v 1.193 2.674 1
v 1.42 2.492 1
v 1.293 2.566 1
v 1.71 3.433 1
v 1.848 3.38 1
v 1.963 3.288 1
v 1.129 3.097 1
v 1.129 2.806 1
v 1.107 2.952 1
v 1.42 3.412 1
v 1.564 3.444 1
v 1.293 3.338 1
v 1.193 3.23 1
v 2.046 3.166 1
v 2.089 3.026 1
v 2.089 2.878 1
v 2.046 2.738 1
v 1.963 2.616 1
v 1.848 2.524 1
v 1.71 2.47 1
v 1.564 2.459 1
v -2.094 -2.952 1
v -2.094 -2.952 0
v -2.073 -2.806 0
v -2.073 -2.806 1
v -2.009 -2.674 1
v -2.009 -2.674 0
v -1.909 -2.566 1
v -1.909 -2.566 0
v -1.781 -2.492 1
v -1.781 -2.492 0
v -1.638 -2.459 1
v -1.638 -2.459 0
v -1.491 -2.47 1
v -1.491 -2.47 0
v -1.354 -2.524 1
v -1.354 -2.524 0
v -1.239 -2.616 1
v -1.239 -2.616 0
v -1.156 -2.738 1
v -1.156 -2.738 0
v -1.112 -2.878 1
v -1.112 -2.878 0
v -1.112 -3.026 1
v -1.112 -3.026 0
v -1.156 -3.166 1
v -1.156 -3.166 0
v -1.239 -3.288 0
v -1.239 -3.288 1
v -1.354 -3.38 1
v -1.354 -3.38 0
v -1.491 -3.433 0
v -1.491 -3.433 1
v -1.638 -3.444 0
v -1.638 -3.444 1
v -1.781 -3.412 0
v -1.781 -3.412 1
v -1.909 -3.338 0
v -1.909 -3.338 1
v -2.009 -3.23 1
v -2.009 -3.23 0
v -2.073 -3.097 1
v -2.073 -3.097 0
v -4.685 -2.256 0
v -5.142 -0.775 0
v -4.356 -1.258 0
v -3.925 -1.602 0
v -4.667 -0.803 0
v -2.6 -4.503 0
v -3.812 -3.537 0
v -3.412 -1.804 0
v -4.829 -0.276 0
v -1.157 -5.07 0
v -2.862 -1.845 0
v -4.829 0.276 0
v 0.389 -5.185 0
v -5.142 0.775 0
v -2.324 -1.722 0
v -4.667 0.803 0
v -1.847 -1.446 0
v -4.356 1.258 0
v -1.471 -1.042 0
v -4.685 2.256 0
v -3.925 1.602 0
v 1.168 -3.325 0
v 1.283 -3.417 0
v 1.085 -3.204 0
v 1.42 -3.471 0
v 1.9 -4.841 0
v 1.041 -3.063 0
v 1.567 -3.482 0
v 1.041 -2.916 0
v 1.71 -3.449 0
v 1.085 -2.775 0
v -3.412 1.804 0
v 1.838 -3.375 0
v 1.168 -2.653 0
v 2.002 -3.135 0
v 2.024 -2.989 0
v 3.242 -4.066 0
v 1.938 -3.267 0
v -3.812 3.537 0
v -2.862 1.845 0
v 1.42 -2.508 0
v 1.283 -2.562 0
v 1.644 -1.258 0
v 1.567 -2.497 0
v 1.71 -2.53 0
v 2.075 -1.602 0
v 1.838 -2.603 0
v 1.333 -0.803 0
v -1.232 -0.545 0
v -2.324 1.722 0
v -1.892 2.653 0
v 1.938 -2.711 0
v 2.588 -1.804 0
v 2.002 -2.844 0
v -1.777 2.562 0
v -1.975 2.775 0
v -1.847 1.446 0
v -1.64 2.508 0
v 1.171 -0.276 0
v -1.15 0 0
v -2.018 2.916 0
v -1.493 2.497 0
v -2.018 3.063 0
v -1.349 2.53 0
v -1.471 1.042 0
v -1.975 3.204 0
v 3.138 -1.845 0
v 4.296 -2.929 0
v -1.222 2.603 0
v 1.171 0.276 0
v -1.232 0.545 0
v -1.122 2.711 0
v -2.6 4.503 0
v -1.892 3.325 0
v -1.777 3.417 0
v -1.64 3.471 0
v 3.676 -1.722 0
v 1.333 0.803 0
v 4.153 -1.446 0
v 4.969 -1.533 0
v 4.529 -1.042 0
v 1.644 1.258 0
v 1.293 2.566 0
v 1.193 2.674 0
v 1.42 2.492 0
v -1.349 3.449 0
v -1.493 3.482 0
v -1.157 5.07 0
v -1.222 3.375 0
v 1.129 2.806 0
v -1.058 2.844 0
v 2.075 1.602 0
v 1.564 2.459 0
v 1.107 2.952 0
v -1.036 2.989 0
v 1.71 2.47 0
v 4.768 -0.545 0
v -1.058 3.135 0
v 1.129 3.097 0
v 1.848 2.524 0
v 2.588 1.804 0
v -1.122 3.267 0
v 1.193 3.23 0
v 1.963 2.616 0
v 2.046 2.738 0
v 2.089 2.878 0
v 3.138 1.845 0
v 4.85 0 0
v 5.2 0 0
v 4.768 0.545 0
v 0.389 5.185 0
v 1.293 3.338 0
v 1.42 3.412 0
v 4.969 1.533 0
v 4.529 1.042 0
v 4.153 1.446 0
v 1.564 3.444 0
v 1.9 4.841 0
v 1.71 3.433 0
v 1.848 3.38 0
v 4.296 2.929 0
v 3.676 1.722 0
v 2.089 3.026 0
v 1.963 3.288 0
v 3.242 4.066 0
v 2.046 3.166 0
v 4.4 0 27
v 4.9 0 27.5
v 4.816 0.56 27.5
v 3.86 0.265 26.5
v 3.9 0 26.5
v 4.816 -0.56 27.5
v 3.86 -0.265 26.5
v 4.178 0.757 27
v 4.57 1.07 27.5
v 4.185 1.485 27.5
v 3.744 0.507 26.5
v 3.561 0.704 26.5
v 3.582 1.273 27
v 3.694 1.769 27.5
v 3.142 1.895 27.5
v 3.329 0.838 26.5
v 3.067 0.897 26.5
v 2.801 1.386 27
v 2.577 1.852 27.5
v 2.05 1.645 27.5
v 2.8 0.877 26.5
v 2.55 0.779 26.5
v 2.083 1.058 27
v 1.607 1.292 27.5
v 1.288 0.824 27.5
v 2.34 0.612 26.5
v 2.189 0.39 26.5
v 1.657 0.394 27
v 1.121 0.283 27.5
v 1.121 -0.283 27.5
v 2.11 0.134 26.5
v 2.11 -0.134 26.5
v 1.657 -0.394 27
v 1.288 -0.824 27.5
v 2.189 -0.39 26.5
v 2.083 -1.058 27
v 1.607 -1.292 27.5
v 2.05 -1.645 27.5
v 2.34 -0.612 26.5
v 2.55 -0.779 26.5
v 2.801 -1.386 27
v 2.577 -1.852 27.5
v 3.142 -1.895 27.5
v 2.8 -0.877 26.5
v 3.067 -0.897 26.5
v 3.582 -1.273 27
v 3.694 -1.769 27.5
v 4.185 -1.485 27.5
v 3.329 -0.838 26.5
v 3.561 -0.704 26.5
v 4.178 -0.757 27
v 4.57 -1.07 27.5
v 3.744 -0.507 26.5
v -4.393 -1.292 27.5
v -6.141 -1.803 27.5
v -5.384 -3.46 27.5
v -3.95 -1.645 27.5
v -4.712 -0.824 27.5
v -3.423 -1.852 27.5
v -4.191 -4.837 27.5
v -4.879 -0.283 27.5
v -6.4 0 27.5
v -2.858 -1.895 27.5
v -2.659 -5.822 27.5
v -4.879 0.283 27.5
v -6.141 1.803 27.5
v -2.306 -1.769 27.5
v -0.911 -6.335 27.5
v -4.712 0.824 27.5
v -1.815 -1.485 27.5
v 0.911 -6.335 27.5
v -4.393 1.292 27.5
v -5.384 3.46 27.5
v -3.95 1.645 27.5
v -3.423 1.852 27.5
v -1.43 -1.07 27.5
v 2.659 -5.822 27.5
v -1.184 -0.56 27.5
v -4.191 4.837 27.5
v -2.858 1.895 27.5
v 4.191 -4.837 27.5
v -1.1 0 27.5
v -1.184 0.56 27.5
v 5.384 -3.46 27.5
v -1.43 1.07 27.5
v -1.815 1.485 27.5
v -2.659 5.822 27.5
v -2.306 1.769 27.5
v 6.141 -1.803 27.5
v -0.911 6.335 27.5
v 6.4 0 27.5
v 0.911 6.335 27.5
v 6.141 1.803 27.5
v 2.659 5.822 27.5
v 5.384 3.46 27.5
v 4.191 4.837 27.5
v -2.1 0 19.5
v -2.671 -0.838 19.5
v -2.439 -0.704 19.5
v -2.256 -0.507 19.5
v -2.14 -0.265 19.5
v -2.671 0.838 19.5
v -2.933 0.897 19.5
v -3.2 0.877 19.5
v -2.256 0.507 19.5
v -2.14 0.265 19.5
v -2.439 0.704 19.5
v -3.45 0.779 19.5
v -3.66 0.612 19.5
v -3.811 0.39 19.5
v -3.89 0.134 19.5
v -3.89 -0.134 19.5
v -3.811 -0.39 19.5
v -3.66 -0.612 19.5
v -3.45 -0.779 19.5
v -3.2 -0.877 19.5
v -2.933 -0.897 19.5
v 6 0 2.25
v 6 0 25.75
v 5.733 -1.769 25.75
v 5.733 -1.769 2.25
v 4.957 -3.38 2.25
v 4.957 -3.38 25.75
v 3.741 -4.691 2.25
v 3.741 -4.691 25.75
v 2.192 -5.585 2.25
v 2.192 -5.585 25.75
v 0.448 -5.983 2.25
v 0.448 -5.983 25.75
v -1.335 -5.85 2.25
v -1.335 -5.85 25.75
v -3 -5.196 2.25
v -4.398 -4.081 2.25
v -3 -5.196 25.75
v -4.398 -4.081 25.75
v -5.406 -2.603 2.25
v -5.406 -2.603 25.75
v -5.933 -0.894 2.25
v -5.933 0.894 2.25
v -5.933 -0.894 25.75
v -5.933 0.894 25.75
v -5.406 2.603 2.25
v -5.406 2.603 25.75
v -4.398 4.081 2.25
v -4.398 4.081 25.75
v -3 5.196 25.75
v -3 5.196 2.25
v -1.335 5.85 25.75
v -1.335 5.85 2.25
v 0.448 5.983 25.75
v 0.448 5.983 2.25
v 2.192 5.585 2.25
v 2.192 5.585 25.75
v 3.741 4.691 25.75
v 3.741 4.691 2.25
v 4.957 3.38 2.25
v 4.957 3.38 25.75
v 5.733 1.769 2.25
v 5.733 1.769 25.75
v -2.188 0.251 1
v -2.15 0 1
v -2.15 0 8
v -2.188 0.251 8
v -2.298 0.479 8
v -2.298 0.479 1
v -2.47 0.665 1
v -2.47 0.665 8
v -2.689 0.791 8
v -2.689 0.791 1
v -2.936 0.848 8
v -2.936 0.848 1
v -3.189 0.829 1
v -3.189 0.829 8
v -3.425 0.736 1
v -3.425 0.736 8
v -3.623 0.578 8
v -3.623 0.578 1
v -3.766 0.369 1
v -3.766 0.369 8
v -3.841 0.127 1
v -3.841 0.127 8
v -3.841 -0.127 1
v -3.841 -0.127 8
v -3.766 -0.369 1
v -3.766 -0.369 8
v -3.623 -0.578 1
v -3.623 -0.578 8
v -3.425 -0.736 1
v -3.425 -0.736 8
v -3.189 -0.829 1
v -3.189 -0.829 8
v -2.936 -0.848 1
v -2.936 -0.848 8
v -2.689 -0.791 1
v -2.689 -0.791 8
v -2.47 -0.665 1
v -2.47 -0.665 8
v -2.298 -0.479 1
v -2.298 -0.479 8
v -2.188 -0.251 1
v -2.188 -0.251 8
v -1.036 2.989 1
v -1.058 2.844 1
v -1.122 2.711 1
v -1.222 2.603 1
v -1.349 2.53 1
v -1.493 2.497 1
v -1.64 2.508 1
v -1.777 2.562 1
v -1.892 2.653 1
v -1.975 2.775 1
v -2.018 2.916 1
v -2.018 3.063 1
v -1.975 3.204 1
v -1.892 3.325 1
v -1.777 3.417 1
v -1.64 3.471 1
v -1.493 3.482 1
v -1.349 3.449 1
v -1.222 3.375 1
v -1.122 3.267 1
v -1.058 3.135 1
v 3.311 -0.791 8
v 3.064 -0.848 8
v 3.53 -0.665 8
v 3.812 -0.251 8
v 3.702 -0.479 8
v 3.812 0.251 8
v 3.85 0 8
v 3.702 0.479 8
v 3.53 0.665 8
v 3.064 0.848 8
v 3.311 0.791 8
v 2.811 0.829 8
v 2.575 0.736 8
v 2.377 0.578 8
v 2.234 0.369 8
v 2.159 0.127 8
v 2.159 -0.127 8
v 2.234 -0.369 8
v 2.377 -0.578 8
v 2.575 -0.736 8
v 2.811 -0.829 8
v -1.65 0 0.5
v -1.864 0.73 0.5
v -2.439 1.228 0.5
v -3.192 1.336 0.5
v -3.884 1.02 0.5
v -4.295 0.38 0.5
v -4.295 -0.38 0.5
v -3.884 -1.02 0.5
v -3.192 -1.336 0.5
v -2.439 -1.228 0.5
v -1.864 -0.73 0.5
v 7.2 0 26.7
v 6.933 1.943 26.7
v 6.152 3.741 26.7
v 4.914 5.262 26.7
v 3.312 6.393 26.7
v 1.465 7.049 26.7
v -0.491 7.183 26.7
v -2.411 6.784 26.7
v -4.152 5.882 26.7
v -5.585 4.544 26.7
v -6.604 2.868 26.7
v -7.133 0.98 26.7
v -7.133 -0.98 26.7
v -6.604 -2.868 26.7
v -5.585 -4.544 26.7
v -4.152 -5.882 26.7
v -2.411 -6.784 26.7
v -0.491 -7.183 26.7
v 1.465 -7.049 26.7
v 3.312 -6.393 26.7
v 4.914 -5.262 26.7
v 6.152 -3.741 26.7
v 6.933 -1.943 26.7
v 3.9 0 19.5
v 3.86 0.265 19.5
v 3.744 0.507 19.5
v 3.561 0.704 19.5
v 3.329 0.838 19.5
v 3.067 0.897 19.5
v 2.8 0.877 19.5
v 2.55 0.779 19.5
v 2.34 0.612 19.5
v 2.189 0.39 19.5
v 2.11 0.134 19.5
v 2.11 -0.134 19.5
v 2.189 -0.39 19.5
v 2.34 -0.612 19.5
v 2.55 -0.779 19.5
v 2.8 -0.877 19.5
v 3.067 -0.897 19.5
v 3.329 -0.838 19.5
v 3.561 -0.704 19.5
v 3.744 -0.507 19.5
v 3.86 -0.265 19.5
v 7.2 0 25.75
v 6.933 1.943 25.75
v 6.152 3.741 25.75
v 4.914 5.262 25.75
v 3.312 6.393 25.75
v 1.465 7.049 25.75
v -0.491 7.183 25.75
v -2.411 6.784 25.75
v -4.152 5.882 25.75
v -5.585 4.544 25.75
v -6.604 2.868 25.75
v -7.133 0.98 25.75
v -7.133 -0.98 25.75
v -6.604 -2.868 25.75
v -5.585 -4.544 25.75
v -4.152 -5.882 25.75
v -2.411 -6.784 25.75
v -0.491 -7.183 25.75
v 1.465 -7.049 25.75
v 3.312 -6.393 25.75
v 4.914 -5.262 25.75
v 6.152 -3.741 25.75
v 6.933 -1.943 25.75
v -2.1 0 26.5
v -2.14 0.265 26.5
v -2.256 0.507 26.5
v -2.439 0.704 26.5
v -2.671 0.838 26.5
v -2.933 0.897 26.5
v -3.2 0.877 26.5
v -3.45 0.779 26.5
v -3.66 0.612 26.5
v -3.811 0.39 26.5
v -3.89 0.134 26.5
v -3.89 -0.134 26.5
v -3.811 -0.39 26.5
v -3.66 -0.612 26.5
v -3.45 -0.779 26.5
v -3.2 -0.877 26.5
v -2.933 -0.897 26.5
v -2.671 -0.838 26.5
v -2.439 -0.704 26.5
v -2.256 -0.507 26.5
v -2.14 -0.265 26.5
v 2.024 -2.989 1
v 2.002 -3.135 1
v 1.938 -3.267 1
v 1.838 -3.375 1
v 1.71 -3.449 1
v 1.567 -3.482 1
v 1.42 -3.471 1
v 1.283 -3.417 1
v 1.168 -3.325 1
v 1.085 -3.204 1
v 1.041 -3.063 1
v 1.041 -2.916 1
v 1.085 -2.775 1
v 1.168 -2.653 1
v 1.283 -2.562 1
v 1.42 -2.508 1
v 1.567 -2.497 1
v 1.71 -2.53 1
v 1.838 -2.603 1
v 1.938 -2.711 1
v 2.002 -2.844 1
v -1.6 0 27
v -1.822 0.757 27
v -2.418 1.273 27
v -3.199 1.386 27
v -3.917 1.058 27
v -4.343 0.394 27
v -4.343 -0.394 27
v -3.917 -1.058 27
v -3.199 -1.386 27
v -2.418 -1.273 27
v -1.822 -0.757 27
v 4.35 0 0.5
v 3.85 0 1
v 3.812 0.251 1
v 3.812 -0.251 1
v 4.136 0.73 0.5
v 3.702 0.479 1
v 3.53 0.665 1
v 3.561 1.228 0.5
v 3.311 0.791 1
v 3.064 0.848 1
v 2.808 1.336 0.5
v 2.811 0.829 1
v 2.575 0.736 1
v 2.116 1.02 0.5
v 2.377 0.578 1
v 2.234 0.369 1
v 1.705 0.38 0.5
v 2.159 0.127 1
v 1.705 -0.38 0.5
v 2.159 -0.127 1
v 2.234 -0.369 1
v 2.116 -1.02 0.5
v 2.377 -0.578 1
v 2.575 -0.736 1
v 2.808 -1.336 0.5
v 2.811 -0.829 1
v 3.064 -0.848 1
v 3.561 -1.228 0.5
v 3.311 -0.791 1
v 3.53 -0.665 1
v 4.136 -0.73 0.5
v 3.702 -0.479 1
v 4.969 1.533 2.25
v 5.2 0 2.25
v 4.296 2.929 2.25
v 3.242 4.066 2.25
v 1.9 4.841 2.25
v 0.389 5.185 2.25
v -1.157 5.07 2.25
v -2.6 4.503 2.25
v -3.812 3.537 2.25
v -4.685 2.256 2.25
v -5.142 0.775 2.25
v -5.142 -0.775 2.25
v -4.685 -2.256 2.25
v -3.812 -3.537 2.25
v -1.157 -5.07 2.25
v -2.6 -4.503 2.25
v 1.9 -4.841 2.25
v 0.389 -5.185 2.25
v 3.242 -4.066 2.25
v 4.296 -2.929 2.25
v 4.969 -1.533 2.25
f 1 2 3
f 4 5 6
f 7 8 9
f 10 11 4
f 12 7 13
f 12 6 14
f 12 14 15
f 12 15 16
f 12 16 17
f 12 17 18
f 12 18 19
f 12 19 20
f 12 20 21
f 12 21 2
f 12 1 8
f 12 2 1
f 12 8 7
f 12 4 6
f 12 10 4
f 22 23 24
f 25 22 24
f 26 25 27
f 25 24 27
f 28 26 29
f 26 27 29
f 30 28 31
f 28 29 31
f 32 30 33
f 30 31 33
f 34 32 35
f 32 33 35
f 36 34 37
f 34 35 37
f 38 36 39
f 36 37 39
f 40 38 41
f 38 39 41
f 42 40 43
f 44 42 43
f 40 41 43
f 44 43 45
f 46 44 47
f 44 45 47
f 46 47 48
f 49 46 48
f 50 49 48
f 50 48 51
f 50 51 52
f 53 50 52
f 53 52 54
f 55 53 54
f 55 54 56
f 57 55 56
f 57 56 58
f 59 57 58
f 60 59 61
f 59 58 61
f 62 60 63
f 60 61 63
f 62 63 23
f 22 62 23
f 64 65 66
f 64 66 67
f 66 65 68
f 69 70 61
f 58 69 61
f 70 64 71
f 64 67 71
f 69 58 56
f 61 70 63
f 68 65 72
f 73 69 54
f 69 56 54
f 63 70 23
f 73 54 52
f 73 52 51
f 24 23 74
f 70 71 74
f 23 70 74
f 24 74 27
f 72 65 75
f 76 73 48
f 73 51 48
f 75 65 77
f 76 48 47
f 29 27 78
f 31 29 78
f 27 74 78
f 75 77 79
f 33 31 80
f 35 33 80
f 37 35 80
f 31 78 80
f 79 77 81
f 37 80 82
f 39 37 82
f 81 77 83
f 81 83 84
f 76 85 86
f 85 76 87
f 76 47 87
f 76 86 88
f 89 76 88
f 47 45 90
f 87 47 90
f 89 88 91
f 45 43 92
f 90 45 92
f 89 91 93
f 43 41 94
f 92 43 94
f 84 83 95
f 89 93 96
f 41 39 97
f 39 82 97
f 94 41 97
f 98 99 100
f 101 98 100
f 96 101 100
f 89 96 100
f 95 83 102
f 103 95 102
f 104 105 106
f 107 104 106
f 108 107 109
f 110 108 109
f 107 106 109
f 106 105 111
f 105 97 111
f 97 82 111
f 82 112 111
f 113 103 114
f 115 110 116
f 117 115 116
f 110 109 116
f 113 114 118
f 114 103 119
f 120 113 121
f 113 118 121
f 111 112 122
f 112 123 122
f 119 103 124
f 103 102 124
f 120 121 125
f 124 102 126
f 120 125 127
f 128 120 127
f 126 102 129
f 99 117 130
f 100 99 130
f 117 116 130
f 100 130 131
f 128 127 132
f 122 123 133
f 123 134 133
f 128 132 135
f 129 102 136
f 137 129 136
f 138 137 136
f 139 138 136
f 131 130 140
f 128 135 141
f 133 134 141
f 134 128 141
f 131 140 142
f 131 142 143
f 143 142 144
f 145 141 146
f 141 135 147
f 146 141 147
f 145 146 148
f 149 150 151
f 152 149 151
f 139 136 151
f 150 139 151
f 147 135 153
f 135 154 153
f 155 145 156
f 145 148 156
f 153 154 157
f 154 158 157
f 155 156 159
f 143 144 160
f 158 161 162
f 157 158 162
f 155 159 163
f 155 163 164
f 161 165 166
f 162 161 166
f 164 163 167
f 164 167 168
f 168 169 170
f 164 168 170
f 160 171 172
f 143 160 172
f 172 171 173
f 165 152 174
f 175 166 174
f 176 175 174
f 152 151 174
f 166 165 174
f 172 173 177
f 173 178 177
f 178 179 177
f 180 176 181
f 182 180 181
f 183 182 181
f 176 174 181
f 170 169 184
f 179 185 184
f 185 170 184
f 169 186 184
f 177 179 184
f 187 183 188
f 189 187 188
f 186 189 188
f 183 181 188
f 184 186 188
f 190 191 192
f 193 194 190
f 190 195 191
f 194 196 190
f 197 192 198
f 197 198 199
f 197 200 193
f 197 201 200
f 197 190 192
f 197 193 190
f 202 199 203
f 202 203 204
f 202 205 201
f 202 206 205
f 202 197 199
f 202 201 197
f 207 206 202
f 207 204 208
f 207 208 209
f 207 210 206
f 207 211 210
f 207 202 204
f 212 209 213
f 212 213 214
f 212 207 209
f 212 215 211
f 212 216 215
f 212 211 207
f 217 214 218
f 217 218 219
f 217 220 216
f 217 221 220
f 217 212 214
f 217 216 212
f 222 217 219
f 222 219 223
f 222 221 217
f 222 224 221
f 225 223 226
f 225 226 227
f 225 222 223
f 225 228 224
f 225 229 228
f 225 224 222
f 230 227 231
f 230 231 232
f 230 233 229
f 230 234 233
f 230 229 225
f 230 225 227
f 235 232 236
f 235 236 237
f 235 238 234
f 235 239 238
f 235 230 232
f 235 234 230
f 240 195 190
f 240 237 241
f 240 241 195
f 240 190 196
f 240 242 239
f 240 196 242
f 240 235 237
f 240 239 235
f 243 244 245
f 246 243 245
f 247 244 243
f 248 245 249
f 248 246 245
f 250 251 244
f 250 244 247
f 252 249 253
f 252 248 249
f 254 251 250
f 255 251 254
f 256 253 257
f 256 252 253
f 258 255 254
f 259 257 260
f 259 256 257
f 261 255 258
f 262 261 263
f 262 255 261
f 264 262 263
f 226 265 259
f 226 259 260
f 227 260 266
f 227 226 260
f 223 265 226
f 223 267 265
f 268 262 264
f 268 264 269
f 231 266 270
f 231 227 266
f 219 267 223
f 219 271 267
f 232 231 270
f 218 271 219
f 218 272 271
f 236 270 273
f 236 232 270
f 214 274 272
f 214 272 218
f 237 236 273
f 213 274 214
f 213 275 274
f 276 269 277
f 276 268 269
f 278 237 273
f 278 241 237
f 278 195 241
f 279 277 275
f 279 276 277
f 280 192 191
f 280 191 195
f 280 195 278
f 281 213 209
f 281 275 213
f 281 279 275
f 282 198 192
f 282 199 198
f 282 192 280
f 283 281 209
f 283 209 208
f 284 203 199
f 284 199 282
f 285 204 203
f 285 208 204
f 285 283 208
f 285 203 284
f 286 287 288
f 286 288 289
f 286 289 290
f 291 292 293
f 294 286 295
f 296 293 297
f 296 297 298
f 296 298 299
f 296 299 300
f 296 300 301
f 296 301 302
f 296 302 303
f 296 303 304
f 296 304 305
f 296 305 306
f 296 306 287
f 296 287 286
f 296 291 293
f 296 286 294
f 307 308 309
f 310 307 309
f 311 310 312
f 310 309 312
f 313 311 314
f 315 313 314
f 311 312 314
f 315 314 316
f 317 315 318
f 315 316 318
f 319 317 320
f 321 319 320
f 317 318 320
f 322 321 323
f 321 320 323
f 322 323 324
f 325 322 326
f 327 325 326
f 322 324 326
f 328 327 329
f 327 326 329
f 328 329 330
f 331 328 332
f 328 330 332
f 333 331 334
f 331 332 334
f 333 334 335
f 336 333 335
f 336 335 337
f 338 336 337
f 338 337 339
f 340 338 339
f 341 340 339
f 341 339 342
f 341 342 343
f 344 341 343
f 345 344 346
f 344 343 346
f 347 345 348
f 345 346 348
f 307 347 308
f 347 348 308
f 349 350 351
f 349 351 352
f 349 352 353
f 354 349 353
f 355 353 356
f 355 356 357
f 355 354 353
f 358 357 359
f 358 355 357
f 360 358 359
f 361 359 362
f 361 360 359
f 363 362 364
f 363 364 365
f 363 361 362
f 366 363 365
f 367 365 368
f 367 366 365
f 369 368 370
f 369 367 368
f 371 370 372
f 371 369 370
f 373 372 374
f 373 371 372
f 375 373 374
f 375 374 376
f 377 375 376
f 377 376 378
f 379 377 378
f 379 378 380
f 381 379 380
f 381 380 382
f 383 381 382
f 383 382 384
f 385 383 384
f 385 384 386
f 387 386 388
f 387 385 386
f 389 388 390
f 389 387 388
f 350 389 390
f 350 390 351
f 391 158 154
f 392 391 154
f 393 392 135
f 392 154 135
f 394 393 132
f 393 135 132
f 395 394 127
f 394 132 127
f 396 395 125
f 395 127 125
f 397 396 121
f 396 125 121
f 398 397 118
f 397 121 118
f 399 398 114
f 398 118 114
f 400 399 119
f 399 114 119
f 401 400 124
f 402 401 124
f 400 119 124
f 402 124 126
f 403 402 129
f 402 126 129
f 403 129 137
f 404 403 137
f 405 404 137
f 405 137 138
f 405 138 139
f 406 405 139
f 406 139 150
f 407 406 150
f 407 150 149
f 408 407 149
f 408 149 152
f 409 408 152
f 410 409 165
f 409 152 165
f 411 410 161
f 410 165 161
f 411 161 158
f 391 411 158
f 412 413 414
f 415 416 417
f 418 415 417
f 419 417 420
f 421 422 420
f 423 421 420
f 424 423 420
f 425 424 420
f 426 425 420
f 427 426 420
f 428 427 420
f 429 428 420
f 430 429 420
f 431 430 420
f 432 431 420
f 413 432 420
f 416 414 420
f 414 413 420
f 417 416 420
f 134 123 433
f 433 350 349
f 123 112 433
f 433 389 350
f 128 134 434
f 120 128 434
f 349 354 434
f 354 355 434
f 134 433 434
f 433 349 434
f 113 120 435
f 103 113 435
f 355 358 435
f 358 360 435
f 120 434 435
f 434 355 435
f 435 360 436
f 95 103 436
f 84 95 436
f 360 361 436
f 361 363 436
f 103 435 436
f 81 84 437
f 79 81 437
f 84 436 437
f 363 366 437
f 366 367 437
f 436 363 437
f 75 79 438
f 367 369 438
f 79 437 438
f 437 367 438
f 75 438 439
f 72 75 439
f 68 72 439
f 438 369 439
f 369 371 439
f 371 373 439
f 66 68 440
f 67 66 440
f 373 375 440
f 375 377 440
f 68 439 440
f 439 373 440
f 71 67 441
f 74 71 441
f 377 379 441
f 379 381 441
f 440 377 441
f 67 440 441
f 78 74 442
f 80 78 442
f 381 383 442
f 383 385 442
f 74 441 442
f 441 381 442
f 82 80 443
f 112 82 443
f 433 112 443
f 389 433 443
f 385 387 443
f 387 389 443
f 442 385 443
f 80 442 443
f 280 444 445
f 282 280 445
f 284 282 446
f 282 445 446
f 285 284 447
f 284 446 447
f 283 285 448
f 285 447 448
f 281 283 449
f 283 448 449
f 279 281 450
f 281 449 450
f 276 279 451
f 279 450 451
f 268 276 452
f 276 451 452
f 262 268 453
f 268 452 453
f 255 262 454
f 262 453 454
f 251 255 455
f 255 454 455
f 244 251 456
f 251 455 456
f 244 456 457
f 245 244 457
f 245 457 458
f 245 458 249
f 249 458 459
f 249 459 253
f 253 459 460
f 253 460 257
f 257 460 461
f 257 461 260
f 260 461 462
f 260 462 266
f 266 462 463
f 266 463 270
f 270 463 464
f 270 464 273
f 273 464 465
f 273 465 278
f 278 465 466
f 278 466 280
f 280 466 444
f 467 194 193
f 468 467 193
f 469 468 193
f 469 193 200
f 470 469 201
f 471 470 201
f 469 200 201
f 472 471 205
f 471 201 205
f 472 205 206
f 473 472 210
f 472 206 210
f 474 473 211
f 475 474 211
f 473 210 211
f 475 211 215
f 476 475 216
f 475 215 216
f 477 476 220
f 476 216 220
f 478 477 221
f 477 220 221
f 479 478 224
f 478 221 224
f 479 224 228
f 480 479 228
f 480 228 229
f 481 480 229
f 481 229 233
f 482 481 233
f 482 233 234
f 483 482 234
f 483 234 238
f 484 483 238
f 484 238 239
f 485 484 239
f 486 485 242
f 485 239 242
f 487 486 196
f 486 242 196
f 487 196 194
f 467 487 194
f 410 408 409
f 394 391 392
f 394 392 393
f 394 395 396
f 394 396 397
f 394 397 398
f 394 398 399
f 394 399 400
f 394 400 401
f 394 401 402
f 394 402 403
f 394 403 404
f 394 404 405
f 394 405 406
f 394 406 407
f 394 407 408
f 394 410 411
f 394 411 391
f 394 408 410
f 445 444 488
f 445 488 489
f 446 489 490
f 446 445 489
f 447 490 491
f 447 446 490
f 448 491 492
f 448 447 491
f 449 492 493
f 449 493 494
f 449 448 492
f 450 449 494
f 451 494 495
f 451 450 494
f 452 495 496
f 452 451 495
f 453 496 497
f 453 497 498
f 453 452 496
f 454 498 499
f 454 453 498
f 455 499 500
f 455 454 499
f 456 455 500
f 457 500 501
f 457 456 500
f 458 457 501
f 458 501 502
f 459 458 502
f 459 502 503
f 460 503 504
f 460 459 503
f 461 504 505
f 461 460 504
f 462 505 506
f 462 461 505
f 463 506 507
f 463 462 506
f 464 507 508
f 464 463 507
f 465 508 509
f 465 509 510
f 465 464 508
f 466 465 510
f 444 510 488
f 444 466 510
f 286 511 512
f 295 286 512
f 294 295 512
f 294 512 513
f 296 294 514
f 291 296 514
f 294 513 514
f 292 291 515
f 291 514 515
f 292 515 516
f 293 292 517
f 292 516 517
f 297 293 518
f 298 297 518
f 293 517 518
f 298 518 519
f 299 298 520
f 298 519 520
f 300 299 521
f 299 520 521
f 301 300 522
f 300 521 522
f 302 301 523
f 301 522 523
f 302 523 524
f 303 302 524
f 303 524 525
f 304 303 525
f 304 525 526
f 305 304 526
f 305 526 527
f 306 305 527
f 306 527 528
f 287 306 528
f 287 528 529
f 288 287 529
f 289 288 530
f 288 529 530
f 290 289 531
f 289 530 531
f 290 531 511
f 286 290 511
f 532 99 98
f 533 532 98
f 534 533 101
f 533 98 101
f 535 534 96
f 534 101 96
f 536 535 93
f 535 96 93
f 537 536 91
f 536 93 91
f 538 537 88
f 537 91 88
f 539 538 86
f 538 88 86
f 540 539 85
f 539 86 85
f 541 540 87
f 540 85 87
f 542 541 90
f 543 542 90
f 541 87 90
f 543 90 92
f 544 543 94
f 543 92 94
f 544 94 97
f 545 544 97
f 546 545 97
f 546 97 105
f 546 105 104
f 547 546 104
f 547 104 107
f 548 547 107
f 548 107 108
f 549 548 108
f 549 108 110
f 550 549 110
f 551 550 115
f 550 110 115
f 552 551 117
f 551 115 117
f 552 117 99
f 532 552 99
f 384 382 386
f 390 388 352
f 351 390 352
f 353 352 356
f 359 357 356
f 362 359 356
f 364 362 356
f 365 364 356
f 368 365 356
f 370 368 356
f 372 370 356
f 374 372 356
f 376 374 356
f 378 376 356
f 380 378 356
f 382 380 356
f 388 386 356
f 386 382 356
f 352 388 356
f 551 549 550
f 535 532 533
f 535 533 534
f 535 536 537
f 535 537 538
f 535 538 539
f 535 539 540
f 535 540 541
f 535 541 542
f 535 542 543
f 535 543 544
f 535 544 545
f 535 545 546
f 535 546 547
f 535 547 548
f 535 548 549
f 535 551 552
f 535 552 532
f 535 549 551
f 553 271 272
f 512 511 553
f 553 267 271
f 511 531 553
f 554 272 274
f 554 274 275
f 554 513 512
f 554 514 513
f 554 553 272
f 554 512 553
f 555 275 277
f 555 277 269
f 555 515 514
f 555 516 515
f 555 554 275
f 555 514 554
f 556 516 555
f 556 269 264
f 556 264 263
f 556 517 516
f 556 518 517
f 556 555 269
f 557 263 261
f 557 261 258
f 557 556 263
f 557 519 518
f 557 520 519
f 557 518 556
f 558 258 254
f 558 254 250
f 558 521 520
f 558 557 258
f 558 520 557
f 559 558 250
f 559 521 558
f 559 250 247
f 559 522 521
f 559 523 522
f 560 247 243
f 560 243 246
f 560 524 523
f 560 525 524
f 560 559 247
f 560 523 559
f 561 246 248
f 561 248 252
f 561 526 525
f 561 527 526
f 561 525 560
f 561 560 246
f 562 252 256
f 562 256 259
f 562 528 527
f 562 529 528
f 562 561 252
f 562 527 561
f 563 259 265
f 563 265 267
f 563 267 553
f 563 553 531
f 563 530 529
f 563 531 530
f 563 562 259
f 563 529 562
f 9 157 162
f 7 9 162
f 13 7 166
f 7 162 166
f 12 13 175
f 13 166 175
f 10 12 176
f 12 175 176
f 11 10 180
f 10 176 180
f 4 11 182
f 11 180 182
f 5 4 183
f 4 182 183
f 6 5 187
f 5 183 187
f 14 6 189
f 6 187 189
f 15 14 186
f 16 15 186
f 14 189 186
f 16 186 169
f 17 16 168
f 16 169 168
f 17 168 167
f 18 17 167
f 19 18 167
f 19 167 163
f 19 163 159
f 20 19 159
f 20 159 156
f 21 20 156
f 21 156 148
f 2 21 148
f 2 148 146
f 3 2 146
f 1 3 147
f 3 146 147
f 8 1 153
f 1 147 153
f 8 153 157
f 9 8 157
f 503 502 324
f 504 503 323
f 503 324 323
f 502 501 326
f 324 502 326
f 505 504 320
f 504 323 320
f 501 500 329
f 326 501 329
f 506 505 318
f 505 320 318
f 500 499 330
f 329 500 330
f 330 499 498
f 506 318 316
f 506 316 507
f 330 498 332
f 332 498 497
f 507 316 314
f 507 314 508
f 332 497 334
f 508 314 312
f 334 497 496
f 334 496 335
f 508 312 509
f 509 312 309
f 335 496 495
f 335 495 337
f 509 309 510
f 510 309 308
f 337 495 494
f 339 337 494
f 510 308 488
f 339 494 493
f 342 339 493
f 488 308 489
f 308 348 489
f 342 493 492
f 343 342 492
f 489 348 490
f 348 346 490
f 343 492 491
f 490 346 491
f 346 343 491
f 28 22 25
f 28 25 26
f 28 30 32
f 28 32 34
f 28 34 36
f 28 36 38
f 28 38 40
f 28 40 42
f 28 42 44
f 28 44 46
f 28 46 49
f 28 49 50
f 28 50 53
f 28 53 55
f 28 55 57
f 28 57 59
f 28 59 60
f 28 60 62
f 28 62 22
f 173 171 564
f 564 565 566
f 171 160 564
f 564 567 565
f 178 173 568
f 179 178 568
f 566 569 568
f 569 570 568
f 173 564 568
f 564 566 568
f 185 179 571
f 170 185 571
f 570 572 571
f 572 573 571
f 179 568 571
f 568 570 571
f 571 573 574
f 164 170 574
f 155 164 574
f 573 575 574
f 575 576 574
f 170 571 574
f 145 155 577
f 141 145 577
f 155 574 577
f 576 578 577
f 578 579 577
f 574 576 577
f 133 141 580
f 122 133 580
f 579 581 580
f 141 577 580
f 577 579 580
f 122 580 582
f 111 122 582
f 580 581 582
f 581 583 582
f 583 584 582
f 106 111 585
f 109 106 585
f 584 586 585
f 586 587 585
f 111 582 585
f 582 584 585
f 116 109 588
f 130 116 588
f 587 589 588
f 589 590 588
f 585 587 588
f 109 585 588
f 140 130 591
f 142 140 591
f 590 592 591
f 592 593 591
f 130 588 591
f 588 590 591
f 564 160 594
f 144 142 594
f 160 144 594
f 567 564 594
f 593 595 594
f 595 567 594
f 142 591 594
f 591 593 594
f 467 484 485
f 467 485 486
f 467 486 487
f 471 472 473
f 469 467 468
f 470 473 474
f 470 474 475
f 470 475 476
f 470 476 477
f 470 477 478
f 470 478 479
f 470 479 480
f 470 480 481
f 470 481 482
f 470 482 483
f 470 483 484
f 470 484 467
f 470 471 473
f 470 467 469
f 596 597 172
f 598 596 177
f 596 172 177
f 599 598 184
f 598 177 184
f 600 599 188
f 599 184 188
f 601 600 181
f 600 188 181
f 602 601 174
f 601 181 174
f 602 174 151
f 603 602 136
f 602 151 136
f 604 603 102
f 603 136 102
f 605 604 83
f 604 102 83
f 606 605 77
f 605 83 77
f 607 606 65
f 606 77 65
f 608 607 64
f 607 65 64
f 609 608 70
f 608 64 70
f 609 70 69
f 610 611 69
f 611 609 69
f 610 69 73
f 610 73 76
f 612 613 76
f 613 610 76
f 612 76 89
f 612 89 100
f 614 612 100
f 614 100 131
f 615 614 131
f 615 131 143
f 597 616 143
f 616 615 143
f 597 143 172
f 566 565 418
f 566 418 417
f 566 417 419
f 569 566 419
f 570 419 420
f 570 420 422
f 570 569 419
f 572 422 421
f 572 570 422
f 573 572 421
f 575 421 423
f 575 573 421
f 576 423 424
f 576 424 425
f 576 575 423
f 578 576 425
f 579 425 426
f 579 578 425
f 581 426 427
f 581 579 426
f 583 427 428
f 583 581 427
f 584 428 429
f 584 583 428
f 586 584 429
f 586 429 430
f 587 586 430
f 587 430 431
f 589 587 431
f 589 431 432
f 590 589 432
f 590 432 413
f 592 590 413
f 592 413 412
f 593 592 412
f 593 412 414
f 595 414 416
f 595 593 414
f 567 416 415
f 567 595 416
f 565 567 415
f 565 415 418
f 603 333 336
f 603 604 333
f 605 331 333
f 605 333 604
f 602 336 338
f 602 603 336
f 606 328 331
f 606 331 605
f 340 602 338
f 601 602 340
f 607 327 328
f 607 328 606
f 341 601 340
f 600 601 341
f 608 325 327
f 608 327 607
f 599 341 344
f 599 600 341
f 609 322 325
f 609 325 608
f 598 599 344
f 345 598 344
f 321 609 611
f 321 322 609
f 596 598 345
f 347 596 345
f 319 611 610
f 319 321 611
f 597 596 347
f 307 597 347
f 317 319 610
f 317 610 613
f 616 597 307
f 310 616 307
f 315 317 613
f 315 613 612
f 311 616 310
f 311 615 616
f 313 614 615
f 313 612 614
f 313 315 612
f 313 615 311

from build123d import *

# Parameters (mm, degrees)
SKETCH_1_R          = 5.2
EXTRUDE_1_DEPTH     = 27.5
SKETCH_6_R          = 7.2
EXTRUDE_3_DEPTH     = 1.75
SKETCH_8_R          = 6
EXTRUDE_4_DEPTH     = 23.5
SKETCH_3_R          = 0.85
CUT_EXTRUDE_4_DEPTH = 8
SKETCH_7_R          = 0.9
CUT_EXTRUDE_5_DEPTH = 8
CHAMFER_1_SIZE      = 1
CHAMFER_2_SIZE      = 1
SKETCH_9_R          = 0.493863849
CUT_EXTRUDE_6_DEPTH = 1
CHAMFER_3_SIZE      = 0.8


with BuildPart() as part:
    # 草图1 → 凸台-拉伸1 (new body)
    with BuildSketch(Plane.XY):
        Circle(SKETCH_1_R)
    extrude(amount=EXTRUDE_1_DEPTH)

    # 草图6 → 凸台-拉伸3 (add)
    with BuildSketch(Plane.XY.offset(27.5)):
        Circle(SKETCH_6_R)
    extrude(amount=-EXTRUDE_3_DEPTH)

    # 草图8 → 凸台-拉伸4 (add)
    with BuildSketch(Plane(origin=(0, 0, 25.75), x_dir=(-1, 0, 0), z_dir=(0, 0, -1))):
        with Locations(Location((0, 0, 0), (0, 0, 180))):
            Circle(SKETCH_8_R)
    extrude(amount=EXTRUDE_4_DEPTH)

    # 草图3 → 切除-拉伸4 (cut)
    with BuildSketch(Plane.XY.offset(27.5)):
        with Locations((-3, 0)):
            Circle(SKETCH_3_R)
        with Locations((3, 0)):
            Circle(SKETCH_3_R)
    cut_extrude_4 = extrude(amount=-CUT_EXTRUDE_4_DEPTH, mode=Mode.SUBTRACT)

    # 镜向3: 切除-拉伸4 across plane
    add(cut_extrude_4.mirror(Plane.XY.offset(13.75)), mode=Mode.SUBTRACT)

    # 草图7 → 切除-拉伸5 (cut)
    with BuildSketch(Plane.XY.offset(27.5)):
        with Locations((-3, 0)):
            Circle(SKETCH_7_R)
        with Locations((3, 0)):
            Circle(SKETCH_7_R)
    extrude(amount=-CUT_EXTRUDE_5_DEPTH, mode=Mode.SUBTRACT)

    # 倒角1
    chamfer_1_edges = [part.edges().sort_by_distance(p)[0] for p in [
        (-3.85, 0, 0),
        (2.15, 0, 0),
    ]]
    chamfer(chamfer_1_edges, length=CHAMFER_1_SIZE)

    # 倒角2
    chamfer_2_edges = [part.edges().sort_by_distance(p)[0] for p in [
        (-3.9, 0, 27.5),
        (2.1, 0, 27.5),
    ]]
    chamfer(chamfer_2_edges, length=CHAMFER_2_SIZE)

    # 草图9 → 切除-拉伸6 (cut)
    with BuildSketch(Plane(origin=(0, 0, 0), x_dir=(-1, 0, 0), z_dir=(0, 0, -1))):
        with Locations((-1.600597529, 2.951921672)):
            Circle(SKETCH_9_R)
        with Locations(Location((1.529748789, 2.989251185, 0), (0, 0, 180))):
            Circle(SKETCH_9_R)
        with Locations((1.600597529, -2.951921672)):
            Circle(SKETCH_9_R)
        with Locations(Location((-1.529748789, -2.989251185, 0), (0, 0, 180))):
            Circle(SKETCH_9_R)
    extrude(amount=-CUT_EXTRUDE_6_DEPTH, mode=Mode.SUBTRACT)

    # 倒角3
    chamfer_3_edges = [part.edges().sort_by_distance(p)[0] for p in [
        (-7.2, 0, 27.5),
    ]]
    chamfer(chamfer_3_edges, length=CHAMFER_3_SIZE)


solid = part.part
